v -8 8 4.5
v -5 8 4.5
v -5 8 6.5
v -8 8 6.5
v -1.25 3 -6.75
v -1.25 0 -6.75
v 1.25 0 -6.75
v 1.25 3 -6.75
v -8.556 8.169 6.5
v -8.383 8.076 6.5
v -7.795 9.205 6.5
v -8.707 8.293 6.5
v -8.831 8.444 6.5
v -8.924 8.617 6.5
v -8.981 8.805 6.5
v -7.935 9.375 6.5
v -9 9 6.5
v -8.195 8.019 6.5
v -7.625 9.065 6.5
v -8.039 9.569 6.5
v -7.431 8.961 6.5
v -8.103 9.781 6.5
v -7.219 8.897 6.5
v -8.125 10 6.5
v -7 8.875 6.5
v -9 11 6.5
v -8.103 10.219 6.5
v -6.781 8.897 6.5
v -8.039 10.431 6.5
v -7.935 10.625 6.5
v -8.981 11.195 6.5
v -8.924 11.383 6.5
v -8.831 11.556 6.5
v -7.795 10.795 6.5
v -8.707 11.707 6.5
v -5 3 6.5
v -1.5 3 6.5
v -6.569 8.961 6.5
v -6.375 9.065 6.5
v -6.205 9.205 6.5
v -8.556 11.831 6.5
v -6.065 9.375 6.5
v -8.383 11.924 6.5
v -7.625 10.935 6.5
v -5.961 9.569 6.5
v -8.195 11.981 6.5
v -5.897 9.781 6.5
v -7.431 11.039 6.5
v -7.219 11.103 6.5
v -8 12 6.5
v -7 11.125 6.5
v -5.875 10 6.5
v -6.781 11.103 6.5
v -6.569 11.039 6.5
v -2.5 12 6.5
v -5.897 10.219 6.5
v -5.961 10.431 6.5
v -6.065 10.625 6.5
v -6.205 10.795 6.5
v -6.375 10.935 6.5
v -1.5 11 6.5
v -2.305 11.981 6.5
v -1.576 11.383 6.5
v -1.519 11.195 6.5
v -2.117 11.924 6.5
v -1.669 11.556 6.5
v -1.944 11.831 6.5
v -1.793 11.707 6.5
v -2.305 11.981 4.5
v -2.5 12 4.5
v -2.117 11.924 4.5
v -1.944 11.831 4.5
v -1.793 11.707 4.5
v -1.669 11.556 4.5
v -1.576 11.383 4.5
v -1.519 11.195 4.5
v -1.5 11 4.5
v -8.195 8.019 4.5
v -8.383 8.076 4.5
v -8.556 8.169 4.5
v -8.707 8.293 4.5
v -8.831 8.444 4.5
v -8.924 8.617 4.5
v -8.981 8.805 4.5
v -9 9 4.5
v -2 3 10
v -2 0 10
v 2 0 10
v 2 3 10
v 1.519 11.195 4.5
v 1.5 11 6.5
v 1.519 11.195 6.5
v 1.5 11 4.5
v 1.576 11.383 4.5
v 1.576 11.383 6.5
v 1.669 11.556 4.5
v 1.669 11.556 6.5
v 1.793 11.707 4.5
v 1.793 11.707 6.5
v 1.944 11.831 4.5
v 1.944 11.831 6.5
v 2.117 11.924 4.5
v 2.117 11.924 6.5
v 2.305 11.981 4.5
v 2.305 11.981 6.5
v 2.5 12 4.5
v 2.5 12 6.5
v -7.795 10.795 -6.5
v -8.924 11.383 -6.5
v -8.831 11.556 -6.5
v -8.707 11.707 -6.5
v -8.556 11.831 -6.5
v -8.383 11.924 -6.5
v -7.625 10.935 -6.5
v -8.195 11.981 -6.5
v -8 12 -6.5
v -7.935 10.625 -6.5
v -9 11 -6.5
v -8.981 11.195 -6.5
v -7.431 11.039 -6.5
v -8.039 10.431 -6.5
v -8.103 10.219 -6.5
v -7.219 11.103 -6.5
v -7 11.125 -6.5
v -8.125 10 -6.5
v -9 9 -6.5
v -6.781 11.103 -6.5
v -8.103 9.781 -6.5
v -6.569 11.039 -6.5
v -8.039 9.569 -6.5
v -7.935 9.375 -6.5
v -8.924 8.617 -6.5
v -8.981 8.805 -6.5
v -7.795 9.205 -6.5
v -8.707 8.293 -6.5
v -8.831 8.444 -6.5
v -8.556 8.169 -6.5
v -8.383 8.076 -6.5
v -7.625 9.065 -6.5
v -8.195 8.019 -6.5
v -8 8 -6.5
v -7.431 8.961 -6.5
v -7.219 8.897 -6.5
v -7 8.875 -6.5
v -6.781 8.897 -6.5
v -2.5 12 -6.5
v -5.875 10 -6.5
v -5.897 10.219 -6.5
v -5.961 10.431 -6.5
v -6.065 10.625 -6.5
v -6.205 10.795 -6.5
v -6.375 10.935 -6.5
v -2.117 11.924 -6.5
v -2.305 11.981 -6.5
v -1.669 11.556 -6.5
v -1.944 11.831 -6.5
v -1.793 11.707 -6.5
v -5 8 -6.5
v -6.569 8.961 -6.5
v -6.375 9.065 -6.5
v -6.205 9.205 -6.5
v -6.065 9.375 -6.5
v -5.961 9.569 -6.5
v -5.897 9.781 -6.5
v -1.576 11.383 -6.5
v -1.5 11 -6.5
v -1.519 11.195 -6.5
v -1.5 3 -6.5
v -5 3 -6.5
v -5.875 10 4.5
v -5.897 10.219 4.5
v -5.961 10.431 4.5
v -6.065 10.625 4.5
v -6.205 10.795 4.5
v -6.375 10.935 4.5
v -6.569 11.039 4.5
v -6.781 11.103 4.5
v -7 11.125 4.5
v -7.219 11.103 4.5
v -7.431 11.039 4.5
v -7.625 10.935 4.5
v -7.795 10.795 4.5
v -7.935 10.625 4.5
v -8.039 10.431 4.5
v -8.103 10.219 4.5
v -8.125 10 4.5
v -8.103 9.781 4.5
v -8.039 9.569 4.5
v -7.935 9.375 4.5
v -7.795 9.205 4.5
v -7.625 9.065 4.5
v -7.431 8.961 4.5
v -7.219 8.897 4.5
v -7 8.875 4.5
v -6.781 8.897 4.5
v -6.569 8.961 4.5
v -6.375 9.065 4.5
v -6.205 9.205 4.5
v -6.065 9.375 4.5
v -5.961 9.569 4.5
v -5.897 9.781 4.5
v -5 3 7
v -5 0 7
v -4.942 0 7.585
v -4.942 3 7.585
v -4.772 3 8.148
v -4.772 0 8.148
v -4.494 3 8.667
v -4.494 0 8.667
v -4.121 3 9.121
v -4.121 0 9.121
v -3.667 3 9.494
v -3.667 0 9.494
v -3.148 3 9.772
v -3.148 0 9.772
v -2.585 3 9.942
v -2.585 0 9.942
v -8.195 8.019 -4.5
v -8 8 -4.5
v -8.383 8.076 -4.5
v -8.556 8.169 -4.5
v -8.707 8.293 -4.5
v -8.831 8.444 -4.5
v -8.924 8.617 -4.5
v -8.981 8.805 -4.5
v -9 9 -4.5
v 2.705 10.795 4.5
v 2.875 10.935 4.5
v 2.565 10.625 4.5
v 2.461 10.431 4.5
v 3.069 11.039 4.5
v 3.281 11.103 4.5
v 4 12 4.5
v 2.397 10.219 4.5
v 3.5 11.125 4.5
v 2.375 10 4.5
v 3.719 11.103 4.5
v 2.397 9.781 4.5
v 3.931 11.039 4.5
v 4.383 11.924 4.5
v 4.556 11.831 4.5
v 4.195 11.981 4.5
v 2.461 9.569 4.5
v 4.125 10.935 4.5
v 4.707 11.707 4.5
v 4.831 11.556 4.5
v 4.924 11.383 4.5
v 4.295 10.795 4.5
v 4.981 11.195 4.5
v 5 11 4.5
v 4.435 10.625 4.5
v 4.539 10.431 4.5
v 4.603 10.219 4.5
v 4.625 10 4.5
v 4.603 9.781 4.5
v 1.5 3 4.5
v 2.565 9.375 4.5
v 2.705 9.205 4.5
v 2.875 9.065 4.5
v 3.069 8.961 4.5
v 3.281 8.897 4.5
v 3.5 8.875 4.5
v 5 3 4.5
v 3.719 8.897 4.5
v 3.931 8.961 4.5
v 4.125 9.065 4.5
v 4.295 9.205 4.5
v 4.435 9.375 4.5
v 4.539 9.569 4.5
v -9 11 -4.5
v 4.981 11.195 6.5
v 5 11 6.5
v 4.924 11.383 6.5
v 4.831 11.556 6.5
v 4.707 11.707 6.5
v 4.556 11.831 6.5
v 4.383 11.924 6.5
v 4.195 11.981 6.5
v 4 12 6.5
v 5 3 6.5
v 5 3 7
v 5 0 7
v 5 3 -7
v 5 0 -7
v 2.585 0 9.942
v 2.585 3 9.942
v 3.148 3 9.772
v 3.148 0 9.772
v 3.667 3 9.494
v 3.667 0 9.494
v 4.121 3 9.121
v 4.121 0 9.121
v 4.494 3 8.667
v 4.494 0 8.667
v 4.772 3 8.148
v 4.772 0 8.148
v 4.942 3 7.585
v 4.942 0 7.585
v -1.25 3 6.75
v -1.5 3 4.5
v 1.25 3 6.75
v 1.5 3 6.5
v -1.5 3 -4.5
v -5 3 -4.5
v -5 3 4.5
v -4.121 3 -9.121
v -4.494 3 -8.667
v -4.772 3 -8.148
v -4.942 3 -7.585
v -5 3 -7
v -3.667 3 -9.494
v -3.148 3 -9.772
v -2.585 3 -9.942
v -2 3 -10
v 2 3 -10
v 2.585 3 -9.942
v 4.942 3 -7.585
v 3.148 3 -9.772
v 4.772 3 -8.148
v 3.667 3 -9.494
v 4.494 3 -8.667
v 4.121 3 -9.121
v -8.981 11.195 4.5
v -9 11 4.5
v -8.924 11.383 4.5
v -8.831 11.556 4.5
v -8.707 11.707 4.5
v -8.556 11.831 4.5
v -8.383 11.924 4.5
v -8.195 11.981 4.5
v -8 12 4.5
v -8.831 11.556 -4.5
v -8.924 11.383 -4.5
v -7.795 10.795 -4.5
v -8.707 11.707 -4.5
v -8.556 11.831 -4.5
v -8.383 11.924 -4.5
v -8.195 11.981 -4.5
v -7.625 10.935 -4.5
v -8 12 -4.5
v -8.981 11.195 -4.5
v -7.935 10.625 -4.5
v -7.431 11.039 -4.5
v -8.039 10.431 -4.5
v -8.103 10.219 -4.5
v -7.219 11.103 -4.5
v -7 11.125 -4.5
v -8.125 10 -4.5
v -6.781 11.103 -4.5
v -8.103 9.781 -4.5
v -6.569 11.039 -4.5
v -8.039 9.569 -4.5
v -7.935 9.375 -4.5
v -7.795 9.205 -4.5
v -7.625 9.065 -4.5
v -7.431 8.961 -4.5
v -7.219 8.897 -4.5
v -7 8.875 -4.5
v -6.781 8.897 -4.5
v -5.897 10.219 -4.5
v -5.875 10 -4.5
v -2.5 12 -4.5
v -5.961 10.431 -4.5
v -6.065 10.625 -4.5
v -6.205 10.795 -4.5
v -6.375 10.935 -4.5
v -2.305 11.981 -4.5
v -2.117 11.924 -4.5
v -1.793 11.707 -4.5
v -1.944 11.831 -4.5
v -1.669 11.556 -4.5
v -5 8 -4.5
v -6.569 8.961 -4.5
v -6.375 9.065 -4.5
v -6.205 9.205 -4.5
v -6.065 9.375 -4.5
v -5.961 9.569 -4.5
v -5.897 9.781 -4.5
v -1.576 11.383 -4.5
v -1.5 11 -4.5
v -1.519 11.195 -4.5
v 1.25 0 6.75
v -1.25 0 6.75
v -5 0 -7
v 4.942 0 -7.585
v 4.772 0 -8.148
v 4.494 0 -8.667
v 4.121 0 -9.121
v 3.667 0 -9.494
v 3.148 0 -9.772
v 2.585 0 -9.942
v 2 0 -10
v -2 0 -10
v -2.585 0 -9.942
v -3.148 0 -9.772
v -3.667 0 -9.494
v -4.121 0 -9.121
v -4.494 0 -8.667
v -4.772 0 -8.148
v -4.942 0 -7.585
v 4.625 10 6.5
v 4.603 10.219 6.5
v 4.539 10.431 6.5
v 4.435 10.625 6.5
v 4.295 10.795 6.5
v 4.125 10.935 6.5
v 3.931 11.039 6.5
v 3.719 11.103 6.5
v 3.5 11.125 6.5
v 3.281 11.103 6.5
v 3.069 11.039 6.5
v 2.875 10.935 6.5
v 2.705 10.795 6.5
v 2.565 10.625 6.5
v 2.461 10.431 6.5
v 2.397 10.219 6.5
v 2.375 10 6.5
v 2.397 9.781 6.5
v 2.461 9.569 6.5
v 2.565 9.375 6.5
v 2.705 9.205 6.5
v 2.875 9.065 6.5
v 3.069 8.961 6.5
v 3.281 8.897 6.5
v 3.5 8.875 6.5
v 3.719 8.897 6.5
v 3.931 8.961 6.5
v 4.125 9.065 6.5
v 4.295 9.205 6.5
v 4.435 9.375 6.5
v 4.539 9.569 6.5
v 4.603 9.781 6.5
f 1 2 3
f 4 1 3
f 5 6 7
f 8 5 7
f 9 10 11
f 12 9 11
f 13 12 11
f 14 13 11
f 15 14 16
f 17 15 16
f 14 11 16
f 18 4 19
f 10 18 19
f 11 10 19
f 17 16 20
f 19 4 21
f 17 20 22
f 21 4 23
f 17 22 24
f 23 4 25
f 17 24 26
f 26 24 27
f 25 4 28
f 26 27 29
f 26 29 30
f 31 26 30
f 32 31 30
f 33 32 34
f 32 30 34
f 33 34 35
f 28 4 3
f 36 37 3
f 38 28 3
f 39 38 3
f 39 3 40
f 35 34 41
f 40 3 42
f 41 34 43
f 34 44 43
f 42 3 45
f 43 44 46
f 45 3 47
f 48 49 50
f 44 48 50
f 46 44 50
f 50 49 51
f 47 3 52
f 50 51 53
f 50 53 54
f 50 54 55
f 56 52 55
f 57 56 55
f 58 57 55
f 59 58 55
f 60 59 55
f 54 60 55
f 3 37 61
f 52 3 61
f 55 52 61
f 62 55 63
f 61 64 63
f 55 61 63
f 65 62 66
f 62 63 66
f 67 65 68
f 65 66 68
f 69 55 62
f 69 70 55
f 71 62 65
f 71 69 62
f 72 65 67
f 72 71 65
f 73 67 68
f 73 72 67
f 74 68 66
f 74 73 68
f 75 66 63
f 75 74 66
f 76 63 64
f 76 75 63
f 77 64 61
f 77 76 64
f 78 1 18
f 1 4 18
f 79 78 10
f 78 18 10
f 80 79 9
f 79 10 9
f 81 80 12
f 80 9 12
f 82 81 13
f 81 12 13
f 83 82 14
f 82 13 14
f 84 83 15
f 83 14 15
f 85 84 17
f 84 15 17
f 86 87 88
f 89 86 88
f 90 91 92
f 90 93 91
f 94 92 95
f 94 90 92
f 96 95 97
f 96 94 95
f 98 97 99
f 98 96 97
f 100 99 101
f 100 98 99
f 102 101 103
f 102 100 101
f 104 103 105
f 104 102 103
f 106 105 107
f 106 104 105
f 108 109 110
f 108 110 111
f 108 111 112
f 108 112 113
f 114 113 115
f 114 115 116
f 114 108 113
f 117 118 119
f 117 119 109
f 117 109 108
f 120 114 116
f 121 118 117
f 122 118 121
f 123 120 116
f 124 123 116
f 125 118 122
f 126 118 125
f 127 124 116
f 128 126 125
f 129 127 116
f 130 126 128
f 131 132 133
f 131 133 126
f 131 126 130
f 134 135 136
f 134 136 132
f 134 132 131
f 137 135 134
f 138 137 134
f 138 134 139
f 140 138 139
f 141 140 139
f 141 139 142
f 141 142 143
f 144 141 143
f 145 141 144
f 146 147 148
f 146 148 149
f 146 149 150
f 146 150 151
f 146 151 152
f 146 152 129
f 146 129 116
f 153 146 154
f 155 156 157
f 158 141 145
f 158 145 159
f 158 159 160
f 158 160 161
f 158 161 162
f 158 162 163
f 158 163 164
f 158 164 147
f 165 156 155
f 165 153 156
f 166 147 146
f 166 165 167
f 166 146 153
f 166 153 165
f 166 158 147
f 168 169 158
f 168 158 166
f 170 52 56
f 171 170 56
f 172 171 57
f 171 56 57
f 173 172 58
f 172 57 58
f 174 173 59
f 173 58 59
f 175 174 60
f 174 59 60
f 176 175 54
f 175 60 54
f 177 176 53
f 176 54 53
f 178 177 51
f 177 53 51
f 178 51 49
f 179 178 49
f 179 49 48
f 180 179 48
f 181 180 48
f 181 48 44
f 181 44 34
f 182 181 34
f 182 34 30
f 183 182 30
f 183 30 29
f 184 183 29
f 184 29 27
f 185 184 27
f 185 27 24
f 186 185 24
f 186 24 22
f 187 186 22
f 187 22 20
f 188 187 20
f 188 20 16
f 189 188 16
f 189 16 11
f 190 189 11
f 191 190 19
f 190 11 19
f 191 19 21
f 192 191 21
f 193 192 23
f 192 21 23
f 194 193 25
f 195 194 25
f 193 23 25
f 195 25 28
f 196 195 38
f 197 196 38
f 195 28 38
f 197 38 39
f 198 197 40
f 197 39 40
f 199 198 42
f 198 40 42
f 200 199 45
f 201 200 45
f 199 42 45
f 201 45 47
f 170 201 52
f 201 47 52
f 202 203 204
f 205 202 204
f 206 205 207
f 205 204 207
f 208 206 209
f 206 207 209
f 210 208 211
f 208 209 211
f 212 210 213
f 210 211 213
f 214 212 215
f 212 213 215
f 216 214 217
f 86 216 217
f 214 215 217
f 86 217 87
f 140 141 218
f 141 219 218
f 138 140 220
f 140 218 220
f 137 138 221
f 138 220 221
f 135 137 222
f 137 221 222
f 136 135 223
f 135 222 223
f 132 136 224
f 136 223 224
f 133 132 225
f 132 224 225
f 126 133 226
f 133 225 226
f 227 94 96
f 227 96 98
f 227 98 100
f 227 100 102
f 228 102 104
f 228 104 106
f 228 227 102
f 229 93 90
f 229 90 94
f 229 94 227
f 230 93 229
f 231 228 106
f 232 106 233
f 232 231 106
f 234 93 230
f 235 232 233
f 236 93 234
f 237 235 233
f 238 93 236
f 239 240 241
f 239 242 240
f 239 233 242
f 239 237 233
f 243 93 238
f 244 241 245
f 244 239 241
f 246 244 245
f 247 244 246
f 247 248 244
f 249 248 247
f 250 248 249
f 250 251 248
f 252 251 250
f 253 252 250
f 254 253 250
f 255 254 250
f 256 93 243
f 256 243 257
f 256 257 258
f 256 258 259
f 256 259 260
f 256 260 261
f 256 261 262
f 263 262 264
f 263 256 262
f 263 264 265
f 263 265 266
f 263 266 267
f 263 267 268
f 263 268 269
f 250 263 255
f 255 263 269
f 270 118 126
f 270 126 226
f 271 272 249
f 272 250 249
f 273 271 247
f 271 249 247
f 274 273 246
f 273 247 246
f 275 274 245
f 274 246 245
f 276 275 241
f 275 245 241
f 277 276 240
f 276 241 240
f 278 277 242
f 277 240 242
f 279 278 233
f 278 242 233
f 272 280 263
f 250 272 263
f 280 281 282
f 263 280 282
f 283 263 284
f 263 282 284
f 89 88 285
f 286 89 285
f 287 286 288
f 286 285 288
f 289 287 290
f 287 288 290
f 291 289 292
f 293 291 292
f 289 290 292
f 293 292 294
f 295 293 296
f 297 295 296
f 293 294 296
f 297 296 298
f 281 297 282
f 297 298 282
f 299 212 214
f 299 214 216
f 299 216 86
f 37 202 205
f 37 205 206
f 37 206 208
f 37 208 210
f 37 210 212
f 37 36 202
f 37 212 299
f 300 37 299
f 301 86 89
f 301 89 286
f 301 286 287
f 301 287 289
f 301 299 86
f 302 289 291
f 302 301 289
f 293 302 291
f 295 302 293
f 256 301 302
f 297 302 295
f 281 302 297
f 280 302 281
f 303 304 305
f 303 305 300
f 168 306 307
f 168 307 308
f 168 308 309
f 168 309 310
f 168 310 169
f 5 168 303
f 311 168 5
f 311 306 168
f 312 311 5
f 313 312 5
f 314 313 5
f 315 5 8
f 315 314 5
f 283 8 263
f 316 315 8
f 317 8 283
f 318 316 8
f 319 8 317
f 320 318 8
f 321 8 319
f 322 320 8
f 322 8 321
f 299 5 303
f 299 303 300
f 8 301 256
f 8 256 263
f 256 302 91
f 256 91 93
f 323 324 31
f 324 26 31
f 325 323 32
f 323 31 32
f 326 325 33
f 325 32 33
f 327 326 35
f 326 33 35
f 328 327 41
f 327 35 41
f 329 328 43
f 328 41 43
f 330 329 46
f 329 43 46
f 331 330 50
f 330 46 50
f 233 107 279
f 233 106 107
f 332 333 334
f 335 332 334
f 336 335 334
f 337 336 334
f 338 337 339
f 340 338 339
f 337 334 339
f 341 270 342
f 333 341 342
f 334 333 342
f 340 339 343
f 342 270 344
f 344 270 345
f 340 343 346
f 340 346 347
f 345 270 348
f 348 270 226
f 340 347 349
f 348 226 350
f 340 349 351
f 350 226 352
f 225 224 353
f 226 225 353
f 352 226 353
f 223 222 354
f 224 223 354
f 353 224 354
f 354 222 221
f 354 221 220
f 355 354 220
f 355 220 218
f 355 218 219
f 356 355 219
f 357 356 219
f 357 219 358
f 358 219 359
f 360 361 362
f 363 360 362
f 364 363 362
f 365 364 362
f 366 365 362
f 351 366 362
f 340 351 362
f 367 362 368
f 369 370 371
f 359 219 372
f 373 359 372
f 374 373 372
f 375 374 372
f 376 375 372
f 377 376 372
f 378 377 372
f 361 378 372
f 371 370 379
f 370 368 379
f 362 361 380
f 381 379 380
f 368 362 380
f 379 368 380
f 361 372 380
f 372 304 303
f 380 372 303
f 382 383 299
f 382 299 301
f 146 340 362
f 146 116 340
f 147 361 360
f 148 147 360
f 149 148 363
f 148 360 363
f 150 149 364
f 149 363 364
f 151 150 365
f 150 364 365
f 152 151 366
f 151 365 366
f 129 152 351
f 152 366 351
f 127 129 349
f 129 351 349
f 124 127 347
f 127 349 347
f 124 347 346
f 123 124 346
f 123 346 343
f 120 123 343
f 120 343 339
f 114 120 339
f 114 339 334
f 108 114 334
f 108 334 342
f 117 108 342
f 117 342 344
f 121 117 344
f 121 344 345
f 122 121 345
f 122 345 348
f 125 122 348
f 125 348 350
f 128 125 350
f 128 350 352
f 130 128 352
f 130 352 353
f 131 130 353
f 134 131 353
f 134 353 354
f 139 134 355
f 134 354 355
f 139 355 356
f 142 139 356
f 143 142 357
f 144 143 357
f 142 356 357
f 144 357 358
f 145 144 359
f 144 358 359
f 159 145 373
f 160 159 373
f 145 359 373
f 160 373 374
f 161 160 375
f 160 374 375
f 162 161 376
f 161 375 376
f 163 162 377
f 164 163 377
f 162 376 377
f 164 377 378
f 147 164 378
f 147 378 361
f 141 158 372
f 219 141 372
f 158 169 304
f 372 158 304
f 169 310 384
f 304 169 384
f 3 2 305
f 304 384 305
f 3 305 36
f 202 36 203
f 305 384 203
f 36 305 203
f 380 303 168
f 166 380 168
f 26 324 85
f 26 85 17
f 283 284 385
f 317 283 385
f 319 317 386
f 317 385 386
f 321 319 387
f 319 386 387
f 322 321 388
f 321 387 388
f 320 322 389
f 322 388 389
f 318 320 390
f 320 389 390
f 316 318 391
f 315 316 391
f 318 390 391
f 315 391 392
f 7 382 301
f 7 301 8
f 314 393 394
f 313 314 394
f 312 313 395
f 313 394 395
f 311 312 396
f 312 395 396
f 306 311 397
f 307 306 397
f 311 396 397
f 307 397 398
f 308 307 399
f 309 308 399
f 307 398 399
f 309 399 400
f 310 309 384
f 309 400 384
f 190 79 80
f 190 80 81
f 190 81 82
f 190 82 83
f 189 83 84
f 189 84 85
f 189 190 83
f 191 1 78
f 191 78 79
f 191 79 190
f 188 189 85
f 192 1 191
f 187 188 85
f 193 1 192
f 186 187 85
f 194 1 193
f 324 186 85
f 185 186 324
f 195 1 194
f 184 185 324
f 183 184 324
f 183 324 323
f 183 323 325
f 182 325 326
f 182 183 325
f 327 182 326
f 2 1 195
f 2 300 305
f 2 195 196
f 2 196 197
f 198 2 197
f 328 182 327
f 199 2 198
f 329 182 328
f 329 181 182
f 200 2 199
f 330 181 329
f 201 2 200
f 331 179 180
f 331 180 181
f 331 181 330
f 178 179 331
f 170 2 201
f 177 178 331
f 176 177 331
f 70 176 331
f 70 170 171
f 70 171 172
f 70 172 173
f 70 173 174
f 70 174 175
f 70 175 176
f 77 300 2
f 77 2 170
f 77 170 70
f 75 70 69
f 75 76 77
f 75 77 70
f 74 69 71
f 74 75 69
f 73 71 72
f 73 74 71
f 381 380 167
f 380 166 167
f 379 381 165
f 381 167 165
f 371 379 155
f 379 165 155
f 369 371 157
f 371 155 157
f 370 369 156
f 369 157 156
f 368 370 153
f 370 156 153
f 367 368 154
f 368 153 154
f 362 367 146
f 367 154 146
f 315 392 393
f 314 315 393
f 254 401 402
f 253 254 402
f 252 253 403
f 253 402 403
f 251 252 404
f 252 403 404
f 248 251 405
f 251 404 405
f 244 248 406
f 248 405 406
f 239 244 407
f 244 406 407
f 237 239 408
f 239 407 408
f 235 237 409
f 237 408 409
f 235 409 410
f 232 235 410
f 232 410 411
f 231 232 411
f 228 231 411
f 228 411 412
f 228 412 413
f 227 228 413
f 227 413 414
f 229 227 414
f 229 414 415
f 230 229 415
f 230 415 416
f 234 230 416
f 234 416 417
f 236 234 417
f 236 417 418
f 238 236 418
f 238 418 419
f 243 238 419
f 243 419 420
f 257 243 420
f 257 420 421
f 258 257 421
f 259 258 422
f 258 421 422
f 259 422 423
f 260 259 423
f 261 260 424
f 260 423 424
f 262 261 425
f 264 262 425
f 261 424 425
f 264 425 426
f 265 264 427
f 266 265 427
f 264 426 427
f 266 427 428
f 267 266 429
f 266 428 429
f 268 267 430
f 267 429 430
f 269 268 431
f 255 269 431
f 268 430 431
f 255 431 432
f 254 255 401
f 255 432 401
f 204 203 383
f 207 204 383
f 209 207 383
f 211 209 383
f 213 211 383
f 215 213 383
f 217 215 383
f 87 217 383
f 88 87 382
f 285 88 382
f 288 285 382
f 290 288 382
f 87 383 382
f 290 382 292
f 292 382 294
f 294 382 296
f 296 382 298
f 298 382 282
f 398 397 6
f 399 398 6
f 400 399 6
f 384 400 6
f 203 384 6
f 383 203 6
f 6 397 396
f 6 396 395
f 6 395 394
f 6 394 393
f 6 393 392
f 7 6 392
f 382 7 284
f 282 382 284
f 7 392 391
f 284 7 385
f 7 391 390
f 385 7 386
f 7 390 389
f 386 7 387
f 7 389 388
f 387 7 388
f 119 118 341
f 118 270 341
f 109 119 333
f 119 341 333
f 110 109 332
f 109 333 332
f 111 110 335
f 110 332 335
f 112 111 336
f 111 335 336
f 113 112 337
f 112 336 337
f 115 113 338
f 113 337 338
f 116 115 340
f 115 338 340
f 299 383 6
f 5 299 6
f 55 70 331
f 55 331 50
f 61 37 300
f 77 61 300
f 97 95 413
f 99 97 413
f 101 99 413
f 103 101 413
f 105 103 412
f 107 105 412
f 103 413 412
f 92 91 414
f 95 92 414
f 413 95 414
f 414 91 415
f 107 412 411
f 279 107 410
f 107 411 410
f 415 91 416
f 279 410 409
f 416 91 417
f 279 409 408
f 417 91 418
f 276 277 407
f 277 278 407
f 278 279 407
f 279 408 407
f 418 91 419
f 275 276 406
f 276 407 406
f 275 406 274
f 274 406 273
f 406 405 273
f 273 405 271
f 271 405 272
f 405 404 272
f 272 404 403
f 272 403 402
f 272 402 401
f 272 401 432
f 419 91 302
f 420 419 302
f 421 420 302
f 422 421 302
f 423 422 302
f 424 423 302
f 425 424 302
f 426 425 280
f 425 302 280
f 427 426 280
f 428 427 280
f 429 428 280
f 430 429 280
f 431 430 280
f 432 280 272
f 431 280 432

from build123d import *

# Parameters (mm, degrees)
CROQUIS1_W              = 2.5
CROQUIS1_H              = 13.5
SALIENTE_EXTRUIR1_DEPTH = 3
CROQUIS2_W              = 3.5
CROQUIS2_H              = 2
SALIENTE_EXTRUIR2_DEPTH = 9
CROQUIS3_R              = 1.125
CORTAR_EXTRUIR1_DEPTH   = 13
CROQUIS5_W              = 2
CROQUIS5_H              = 4
SALIENTE_EXTRUIR3_DEPTH = 4
CROQUIS6_R              = 1.125
CORTAR_EXTRUIR3_DEPTH   = 23.299103121
REDONDEO2_R             = 1


with BuildPart() as part:
    # Croquis1 → Saliente-Extruir1 (new body)
    with BuildSketch(Plane(origin=(0, 0, 0), x_dir=(1, 0, 0), z_dir=(0, 1, 0))):
        with BuildLine():
            Line((-2, -10), (2, -10))
            ThreePointArc((2, -10), (4.121320344, -9.121320344), (5, -7))
            Line((5, -7), (5, 7))
            ThreePointArc((5, 7), (4.121320344, 9.121320344), (2, 10))
            Line((2, 10), (-2, 10))
            ThreePointArc((-2, 10), (-4.121320344, 9.121320344), (-5, 7))
            Line((-5, 7), (-5, -7))
            ThreePointArc((-5, -7), (-4.121320344, -9.121320344), (-2, -10))
        make_face()
        Rectangle(CROQUIS1_W, CROQUIS1_H, mode=Mode.SUBTRACT)
    extrude(amount=SALIENTE_EXTRUIR1_DEPTH)

    # Croquis2 → Saliente-Extruir2 (add)
    with BuildSketch(Plane(origin=(0, 3, 0), x_dir=(1, 0, 0), z_dir=(0, 1, 0))):
        with Locations((-3.25, 5.5)):
            Rectangle(CROQUIS2_W, CROQUIS2_H)
        with Locations((-3.25, -5.5)):
            Rectangle(CROQUIS2_W, CROQUIS2_H)
        with Locations((3.25, -5.5)):
            Rectangle(CROQUIS2_W, CROQUIS2_H)
    extrude(amount=SALIENTE_EXTRUIR2_DEPTH)

    # Croquis3 → Cortar-Extruir1 (cut)
    with BuildSketch(Plane.XY.offset(6.5)):
        with Locations((3.5, 10)):
            Circle(CROQUIS3_R)
    extrude(amount=-CORTAR_EXTRUIR1_DEPTH, mode=Mode.SUBTRACT)

    # Croquis5 → Saliente-Extruir3 (add)
    with BuildSketch(Plane.ZY.offset(5)):
        with Locations((5.5, 10)):
            Rectangle(CROQUIS5_W, CROQUIS5_H)
        with Locations((-5.5, 10)):
            Rectangle(CROQUIS5_W, CROQUIS5_H)
    extrude(amount=SALIENTE_EXTRUIR3_DEPTH)

    # Croquis6 → Cortar-Extruir3 (cut, through all)
    with BuildSketch(Plane.XY.offset(6.5)):
        with Locations((-7, 10)):
            Circle(CROQUIS6_R)
    extrude(amount=-CORTAR_EXTRUIR3_DEPTH, mode=Mode.SUBTRACT)

    # Redondeo2
    redondeo2_edges = [part.edges().sort_by_distance(p)[0] for p in [
        (-1.5, 12, -5.5),
        (-1.5, 12, 5.5),
        (1.5, 12, 5.5),
        (5, 12, 5.5),
        (-9, 8, 5.5),
        (-9, 12, 5.5),
        (-9, 12, -5.5),
        (-9, 8, -5.5),
    ]]
    fillet(redondeo2_edges, radius=REDONDEO2_R)


solid = part.part
